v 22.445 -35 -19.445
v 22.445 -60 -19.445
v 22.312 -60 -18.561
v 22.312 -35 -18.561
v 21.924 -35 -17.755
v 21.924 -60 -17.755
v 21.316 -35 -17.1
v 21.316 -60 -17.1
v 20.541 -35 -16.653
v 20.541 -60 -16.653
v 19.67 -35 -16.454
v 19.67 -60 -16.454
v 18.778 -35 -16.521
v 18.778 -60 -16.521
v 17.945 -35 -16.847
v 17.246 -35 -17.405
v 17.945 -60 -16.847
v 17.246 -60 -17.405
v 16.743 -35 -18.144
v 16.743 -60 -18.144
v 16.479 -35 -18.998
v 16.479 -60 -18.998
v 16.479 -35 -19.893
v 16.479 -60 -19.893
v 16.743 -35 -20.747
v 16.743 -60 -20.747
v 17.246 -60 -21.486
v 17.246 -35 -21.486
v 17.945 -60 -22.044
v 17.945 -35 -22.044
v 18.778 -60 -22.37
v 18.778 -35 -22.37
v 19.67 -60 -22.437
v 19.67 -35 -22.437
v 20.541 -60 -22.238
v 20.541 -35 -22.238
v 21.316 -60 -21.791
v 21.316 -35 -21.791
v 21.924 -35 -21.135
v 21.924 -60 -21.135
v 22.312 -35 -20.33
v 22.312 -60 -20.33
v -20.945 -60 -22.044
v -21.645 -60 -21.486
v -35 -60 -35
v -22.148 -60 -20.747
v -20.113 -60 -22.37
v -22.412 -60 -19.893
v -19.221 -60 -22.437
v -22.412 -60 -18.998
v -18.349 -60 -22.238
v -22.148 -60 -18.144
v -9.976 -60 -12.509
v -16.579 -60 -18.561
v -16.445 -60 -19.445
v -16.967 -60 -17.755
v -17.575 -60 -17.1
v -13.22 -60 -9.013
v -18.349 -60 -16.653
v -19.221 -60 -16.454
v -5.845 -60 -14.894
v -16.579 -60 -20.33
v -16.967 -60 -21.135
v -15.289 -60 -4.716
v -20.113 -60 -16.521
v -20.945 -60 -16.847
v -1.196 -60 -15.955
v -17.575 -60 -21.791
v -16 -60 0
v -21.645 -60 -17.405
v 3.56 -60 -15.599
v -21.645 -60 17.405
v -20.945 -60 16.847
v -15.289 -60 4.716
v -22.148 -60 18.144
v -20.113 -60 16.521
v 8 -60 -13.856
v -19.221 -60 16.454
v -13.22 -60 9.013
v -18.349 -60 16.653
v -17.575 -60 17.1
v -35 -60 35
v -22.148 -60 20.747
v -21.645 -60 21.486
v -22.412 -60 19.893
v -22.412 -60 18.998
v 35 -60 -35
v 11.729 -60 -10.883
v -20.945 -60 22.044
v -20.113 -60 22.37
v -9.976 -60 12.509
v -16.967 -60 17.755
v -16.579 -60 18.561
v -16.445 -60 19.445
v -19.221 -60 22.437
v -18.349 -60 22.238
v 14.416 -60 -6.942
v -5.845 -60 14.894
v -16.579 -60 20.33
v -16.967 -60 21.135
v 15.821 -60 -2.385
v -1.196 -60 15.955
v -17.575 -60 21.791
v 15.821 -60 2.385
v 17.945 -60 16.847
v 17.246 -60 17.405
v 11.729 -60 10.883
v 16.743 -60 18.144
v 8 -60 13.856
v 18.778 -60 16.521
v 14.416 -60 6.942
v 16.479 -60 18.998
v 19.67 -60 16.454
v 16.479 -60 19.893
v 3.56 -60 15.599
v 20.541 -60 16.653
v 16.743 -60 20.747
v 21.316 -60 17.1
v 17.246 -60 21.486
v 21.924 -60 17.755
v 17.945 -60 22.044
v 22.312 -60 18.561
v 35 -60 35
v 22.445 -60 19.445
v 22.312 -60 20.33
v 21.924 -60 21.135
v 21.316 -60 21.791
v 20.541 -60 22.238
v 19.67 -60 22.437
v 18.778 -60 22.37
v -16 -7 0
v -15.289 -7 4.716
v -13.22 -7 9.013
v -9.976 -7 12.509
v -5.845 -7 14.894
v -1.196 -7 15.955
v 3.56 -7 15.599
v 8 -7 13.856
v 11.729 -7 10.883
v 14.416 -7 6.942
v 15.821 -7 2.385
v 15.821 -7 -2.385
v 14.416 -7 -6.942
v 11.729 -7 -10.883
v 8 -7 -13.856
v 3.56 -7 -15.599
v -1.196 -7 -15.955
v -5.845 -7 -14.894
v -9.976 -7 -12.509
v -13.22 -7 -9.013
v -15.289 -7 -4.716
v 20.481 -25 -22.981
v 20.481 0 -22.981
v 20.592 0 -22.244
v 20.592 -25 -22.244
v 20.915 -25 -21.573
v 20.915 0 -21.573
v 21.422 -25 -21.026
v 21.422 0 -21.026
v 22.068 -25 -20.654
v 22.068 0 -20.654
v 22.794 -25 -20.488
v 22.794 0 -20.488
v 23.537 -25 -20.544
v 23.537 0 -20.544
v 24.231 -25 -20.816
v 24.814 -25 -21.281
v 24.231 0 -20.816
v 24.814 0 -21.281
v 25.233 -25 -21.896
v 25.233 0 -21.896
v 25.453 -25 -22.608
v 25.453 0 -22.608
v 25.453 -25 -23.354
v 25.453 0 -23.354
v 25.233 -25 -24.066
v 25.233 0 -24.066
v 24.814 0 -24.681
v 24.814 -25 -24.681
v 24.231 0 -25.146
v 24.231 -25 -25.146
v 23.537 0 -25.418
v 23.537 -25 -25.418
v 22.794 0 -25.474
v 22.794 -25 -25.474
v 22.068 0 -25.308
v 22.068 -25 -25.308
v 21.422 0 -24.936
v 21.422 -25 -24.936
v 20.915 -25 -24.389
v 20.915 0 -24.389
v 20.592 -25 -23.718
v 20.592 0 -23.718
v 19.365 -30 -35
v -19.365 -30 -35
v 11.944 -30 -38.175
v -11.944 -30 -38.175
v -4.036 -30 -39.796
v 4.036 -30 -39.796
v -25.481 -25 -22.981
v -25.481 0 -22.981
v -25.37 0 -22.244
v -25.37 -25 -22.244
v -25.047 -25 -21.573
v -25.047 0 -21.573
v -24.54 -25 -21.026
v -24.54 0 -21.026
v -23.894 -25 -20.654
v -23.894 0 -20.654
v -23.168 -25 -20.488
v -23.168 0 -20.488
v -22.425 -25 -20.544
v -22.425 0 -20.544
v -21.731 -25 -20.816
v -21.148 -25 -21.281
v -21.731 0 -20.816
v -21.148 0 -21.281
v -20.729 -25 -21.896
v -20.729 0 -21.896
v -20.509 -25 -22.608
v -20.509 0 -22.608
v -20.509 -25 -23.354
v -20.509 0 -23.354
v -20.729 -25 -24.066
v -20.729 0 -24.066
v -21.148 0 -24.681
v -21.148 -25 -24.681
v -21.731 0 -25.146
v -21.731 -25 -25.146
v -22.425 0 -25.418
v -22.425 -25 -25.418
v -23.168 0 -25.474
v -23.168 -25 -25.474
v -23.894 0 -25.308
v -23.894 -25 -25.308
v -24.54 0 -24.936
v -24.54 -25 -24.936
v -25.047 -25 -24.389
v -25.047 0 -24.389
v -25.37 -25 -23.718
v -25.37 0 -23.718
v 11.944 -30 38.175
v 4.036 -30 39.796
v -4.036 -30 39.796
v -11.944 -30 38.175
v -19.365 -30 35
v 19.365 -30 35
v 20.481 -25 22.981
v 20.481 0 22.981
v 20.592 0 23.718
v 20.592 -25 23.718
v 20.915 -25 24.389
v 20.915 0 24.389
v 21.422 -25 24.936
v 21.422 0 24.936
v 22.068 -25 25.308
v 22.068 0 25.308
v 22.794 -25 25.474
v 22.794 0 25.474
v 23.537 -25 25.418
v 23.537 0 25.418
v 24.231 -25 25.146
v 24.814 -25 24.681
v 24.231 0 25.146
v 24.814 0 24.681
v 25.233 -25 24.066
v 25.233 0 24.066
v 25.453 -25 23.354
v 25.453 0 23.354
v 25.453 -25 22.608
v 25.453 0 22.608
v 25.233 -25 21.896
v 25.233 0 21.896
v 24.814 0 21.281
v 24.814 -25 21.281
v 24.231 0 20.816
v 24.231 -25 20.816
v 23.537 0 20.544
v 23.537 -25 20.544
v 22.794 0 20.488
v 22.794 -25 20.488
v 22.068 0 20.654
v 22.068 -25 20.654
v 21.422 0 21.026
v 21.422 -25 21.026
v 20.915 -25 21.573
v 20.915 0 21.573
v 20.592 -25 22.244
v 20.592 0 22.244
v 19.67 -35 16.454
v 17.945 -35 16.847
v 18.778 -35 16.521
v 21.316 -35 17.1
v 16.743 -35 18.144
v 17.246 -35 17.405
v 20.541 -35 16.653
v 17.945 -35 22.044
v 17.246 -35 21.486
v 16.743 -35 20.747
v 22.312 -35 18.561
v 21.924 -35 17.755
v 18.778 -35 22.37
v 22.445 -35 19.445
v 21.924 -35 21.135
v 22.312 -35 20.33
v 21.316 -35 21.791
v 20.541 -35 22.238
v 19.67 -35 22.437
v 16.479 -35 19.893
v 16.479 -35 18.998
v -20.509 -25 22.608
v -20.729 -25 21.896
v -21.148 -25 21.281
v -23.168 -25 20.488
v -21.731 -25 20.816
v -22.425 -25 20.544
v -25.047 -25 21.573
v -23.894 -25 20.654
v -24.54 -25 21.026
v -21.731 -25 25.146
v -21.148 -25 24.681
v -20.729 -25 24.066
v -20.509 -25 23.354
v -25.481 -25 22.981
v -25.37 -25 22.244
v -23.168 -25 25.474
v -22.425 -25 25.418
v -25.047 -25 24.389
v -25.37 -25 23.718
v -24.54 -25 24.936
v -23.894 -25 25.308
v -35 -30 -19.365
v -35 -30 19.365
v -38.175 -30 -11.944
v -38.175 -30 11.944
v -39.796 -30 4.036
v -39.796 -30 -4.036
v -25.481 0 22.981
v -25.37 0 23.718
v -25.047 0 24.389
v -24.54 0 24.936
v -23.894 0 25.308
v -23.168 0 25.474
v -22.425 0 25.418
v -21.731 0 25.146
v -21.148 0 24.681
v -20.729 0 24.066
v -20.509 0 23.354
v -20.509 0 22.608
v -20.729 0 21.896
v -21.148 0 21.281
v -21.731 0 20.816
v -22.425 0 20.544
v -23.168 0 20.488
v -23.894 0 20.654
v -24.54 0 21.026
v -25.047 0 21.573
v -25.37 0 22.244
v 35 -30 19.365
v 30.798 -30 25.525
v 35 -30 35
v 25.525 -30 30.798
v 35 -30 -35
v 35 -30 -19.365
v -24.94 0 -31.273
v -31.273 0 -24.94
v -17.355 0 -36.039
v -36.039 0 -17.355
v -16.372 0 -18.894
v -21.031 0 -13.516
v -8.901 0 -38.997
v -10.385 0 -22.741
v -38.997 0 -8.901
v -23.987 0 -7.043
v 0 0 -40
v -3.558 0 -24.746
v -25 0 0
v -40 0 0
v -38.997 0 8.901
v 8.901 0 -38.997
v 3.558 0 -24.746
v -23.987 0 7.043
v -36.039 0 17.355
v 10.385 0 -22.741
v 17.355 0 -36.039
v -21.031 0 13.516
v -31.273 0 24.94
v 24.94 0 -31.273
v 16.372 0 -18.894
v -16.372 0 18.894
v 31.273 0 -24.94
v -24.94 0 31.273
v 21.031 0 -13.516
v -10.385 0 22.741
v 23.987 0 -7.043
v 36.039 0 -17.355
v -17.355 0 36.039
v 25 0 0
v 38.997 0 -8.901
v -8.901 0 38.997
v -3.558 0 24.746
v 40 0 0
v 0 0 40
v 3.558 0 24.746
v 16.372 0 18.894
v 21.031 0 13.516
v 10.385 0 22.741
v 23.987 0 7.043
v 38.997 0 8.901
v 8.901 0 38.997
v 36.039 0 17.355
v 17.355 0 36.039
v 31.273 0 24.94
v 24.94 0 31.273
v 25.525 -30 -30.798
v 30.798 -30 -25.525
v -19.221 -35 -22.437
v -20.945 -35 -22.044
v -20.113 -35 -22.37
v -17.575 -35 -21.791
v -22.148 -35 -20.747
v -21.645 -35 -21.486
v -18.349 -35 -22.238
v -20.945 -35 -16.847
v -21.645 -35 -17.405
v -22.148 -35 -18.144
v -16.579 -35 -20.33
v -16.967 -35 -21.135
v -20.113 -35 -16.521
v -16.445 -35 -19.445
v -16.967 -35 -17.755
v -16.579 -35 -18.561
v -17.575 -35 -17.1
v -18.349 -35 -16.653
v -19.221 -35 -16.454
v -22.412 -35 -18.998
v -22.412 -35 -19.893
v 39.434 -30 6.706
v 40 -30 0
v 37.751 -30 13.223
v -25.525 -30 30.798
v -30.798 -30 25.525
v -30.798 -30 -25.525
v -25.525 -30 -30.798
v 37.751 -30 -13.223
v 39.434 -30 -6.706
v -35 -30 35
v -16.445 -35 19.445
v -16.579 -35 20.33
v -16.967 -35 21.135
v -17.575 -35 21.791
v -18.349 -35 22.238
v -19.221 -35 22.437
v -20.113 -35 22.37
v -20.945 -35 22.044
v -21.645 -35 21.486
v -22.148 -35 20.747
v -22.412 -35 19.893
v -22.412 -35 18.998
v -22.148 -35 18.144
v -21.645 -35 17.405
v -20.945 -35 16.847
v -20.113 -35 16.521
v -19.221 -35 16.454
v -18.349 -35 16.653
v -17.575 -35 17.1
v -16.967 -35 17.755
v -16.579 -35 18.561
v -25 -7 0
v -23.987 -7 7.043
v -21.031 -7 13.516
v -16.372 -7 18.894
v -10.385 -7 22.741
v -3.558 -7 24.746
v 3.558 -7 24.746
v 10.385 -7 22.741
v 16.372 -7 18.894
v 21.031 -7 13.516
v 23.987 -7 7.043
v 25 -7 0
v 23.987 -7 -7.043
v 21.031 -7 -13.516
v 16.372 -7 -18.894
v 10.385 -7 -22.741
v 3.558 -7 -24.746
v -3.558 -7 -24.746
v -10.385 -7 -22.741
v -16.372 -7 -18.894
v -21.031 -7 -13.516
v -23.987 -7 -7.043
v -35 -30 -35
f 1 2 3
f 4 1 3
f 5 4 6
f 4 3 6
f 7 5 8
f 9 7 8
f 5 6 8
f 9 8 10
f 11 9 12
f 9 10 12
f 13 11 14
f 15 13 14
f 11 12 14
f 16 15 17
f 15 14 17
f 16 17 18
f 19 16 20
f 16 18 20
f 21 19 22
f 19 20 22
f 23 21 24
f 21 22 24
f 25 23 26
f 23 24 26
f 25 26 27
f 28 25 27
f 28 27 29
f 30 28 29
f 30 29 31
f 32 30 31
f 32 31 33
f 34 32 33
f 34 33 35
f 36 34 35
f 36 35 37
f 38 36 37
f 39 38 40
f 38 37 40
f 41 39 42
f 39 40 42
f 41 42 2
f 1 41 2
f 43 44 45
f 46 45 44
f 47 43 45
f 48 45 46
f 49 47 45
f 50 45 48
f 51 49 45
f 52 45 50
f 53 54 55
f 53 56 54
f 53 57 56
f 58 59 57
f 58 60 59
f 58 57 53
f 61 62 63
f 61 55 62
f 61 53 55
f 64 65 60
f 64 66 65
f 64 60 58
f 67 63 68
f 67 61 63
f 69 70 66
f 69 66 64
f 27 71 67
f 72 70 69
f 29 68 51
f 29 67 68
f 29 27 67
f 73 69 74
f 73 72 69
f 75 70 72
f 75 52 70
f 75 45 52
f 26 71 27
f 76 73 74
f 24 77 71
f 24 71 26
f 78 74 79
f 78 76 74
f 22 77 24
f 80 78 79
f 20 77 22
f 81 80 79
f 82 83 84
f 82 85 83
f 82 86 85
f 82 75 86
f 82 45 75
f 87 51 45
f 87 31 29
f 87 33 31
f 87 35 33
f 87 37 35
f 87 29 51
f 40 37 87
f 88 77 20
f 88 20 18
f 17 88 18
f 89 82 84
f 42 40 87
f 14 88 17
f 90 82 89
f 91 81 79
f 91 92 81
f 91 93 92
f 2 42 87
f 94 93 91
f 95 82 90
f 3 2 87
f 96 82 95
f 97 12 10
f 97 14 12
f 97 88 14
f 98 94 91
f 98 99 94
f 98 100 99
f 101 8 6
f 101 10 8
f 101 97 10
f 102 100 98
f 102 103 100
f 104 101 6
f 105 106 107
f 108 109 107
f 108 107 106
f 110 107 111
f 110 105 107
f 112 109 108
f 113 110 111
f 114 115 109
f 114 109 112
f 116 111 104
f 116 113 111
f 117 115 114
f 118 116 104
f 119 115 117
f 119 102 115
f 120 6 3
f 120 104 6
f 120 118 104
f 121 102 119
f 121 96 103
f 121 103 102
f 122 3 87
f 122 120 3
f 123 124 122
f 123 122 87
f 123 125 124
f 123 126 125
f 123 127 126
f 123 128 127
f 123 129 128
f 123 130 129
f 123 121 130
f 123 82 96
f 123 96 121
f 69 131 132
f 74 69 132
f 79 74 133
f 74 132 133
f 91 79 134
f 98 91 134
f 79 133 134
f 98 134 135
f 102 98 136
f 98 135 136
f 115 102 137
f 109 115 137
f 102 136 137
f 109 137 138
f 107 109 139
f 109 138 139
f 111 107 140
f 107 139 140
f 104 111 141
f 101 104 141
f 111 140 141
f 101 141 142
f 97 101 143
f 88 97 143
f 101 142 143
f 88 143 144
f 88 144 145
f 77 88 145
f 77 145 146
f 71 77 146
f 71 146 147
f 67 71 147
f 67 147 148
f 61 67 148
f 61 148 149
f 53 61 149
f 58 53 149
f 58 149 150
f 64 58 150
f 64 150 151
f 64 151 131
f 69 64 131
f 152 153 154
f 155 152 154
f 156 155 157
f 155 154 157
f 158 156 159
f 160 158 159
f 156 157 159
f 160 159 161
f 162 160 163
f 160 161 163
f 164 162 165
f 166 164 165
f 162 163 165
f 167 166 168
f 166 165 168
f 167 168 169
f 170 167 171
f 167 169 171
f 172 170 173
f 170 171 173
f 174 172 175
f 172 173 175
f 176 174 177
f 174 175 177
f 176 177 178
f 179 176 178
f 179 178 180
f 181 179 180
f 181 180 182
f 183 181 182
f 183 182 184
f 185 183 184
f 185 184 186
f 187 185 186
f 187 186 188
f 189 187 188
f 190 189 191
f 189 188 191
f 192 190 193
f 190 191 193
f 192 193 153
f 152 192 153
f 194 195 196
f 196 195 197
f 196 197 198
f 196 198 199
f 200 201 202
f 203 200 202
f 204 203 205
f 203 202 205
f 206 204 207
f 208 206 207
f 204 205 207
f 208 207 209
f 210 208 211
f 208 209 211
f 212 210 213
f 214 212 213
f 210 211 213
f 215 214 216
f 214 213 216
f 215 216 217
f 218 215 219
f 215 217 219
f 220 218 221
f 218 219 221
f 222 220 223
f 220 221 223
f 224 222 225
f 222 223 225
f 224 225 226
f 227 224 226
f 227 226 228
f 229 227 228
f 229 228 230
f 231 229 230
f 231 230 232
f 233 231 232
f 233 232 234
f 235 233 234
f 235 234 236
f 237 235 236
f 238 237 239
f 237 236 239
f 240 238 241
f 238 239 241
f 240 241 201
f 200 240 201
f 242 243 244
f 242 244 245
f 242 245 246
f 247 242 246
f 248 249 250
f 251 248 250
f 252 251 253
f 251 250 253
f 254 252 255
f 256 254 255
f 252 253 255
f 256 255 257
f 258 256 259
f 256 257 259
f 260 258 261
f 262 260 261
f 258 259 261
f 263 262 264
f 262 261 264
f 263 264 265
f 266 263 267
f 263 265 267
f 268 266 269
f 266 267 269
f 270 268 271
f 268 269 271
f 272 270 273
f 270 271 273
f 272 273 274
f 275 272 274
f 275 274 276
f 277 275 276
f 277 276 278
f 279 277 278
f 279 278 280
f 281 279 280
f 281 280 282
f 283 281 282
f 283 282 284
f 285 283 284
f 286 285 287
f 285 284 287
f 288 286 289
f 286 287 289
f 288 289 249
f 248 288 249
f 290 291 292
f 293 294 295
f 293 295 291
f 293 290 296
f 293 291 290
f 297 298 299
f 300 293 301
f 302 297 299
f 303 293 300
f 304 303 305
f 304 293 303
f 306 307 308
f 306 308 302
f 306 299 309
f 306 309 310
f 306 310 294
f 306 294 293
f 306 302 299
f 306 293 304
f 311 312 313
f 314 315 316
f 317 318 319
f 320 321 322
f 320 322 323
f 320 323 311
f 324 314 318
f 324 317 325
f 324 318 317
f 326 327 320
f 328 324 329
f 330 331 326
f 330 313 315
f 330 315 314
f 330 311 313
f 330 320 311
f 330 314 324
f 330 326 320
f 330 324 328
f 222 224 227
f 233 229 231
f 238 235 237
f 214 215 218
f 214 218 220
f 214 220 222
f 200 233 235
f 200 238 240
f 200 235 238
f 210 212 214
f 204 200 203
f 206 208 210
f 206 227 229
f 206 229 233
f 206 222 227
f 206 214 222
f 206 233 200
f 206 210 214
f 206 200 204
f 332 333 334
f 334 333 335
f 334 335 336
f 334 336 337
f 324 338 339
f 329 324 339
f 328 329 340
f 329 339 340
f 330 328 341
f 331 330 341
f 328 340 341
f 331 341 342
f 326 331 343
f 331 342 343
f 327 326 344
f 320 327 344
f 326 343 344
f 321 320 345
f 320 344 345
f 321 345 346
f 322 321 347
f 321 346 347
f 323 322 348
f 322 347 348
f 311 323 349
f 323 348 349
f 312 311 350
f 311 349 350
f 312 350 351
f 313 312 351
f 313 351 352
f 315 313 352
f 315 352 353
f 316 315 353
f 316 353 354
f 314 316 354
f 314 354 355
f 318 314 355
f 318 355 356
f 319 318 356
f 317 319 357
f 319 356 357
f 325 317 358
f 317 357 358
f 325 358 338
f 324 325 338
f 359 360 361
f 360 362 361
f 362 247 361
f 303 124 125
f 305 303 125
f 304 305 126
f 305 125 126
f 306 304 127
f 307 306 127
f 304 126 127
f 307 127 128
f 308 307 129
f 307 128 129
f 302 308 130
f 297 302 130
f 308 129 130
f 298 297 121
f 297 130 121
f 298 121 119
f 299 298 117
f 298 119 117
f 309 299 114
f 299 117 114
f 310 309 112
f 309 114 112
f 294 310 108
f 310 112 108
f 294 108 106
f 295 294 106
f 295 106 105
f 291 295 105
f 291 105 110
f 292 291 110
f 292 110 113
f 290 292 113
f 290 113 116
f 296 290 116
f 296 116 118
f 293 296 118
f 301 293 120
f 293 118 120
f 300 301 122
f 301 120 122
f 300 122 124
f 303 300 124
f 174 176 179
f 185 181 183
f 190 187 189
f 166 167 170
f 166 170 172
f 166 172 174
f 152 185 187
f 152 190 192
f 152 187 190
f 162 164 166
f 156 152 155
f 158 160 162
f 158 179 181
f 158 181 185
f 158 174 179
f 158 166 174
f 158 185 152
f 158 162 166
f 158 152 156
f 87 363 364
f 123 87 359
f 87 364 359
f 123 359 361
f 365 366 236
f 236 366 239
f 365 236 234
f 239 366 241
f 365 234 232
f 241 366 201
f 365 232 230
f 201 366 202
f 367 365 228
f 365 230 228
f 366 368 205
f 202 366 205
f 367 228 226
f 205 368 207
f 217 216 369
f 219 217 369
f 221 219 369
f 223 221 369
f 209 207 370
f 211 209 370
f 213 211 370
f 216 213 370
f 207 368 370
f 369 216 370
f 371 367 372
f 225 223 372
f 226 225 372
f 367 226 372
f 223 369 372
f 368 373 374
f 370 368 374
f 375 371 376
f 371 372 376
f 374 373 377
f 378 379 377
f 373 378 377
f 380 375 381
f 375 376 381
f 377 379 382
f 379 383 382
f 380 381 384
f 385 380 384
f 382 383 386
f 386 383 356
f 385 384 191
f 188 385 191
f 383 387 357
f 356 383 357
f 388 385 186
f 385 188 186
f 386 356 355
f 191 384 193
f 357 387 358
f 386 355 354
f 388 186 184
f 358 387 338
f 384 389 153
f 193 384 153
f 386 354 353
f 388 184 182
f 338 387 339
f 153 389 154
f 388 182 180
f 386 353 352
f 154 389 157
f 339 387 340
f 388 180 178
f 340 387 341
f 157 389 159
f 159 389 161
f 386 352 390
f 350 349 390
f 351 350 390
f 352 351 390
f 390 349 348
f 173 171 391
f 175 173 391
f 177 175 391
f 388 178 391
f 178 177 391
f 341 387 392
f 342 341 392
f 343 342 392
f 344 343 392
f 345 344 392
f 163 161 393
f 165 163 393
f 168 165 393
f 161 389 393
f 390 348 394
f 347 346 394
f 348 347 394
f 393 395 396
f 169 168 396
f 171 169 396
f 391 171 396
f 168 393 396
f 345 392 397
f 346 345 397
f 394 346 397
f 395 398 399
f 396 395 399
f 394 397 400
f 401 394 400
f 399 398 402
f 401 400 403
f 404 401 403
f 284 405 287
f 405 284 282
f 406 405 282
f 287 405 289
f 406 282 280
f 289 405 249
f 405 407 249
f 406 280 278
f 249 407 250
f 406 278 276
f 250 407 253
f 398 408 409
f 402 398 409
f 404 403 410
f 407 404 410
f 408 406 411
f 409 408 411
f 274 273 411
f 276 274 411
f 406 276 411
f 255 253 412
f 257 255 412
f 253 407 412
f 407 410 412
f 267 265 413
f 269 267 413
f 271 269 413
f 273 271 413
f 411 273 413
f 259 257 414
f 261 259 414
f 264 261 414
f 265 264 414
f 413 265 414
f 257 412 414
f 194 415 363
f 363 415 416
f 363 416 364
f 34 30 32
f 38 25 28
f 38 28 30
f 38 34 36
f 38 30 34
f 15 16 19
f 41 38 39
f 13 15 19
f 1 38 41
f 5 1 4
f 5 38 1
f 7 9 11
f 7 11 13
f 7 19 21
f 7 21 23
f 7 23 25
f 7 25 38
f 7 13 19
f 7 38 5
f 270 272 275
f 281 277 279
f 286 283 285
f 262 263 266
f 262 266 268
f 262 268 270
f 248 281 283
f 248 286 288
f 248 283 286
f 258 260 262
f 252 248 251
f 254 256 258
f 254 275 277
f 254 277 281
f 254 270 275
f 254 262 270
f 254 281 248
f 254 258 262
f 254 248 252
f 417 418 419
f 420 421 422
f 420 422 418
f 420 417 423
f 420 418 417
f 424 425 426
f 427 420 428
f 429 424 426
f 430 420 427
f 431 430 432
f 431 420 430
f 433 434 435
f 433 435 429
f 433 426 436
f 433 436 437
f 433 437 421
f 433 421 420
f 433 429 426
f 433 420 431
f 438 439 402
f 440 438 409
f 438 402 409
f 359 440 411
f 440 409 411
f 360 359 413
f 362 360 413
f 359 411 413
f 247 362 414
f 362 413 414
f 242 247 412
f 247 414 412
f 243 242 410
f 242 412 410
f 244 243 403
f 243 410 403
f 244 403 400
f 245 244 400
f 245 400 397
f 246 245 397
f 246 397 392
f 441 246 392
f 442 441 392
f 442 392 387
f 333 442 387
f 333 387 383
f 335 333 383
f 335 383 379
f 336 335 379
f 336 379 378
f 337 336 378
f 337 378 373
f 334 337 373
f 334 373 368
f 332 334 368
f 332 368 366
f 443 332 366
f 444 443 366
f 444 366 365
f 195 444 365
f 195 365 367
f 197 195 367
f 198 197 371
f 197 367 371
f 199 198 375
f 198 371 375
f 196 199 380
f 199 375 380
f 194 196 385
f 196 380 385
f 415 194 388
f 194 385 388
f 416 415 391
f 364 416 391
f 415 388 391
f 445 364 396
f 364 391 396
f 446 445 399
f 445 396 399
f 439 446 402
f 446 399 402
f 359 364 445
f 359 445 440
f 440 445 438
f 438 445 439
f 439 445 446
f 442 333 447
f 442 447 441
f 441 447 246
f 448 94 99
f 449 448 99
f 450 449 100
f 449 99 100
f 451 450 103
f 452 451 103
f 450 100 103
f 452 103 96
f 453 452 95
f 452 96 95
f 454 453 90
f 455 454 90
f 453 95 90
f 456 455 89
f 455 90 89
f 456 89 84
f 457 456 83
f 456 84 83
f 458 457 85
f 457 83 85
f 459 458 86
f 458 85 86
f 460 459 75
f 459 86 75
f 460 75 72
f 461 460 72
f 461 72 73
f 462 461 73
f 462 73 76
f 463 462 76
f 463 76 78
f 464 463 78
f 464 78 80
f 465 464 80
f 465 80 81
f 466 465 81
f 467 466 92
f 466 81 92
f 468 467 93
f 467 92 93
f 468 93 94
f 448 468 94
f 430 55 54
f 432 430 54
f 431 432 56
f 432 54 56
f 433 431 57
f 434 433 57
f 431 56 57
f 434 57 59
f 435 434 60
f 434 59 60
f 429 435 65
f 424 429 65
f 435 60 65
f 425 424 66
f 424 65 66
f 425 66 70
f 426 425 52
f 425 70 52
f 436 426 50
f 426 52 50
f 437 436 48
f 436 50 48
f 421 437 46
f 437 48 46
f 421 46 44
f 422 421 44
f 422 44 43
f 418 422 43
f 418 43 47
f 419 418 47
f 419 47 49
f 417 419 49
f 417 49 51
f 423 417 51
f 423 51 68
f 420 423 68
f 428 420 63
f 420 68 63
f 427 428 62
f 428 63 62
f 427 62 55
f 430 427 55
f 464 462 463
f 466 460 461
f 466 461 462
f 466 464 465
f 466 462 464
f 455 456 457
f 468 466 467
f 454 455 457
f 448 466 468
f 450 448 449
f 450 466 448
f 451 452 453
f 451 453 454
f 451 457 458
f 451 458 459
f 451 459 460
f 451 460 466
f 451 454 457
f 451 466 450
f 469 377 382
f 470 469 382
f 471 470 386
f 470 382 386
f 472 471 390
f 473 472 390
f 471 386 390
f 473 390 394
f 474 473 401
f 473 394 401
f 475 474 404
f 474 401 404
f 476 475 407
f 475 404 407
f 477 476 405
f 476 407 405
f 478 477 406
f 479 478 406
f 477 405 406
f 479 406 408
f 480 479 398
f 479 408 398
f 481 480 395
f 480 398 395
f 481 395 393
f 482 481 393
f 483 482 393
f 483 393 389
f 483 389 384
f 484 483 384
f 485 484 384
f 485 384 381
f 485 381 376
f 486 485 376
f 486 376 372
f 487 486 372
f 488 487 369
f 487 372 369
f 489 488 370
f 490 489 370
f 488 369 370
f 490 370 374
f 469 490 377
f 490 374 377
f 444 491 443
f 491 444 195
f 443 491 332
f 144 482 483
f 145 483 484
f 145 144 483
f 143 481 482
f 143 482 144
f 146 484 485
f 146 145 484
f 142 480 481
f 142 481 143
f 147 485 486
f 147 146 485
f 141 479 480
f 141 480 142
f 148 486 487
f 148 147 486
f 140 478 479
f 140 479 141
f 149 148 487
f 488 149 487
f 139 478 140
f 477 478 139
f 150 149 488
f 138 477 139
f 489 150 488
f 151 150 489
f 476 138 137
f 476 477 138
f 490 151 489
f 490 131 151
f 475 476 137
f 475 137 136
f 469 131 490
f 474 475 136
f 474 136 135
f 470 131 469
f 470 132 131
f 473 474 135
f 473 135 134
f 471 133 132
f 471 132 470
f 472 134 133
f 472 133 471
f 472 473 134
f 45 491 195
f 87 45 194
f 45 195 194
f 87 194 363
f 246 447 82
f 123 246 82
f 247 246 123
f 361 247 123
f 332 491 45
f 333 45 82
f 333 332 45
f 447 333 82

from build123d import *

# Parameters (mm, degrees)
F0_R      = 40
F1_DEPTH  = 30
F2_W      = 70
F2_H      = 70
F3_DEPTH  = 30
F4_R      = 16
F5_DEPTH  = 60.001
F6_R      = 25
F7_DEPTH  = 7
F8_R      = 2.5
F9_DEPTH  = 25
F10_R     = 3
F11_DEPTH = 25


with BuildPart() as f1:
    # F0 (on Front) → F1 (new body)
    with BuildSketch(Plane.XZ):
        Circle(F0_R)
    extrude(amount=F1_DEPTH)

    # F2 (on face) → F3 (join)
    with BuildSketch(Plane.XZ.offset(30)):
        Rectangle(F2_W, F2_H)
    extrude(amount=F3_DEPTH)

    # F4 (on face) → F5 (cut, through all)
    with BuildSketch(Plane(origin=(0, 0, 0), x_dir=(-1, 0, 0), z_dir=(0, 1, 0))):
        Circle(F4_R)
    extrude(amount=-F5_DEPTH, mode=Mode.SUBTRACT)

    # F6 (on face) → F7 (cut)
    with BuildSketch(Plane(origin=(0, 0, 0), x_dir=(-1, 0, 0), z_dir=(0, 1, 0))):
        Circle(F6_R)
    extrude(amount=-F7_DEPTH, mode=Mode.SUBTRACT)

    # F8 (on face) → F9 (cut)
    with BuildSketch(Plane(origin=(0, 0, 0), x_dir=(-1, 0, 0), z_dir=(0, 1, 0))):
        with Locations((-22.98097, 22.98097)):
            Circle(F8_R)
        with Locations((22.98097, 22.98097)):
            Circle(F8_R)
        with Locations((22.98097, -22.98097)):
            Circle(F8_R)
        with Locations((-22.98097, -22.98097)):
            Circle(F8_R)
    extrude(amount=-F9_DEPTH, mode=Mode.SUBTRACT)

    # F10 (on face) → F11 (cut)
    with BuildSketch(Plane.XZ.offset(60)):
        with Locations((-19.445436, 19.445436)):
            Circle(F10_R)
        with Locations((19.445436, 19.445436)):
            Circle(F10_R)
        with Locations((19.445436, -19.445436)):
            Circle(F10_R)
        with Locations((-19.445436, -19.445436)):
            Circle(F10_R)
    extrude(amount=-F11_DEPTH, mode=Mode.SUBTRACT)


solid = f1.part
